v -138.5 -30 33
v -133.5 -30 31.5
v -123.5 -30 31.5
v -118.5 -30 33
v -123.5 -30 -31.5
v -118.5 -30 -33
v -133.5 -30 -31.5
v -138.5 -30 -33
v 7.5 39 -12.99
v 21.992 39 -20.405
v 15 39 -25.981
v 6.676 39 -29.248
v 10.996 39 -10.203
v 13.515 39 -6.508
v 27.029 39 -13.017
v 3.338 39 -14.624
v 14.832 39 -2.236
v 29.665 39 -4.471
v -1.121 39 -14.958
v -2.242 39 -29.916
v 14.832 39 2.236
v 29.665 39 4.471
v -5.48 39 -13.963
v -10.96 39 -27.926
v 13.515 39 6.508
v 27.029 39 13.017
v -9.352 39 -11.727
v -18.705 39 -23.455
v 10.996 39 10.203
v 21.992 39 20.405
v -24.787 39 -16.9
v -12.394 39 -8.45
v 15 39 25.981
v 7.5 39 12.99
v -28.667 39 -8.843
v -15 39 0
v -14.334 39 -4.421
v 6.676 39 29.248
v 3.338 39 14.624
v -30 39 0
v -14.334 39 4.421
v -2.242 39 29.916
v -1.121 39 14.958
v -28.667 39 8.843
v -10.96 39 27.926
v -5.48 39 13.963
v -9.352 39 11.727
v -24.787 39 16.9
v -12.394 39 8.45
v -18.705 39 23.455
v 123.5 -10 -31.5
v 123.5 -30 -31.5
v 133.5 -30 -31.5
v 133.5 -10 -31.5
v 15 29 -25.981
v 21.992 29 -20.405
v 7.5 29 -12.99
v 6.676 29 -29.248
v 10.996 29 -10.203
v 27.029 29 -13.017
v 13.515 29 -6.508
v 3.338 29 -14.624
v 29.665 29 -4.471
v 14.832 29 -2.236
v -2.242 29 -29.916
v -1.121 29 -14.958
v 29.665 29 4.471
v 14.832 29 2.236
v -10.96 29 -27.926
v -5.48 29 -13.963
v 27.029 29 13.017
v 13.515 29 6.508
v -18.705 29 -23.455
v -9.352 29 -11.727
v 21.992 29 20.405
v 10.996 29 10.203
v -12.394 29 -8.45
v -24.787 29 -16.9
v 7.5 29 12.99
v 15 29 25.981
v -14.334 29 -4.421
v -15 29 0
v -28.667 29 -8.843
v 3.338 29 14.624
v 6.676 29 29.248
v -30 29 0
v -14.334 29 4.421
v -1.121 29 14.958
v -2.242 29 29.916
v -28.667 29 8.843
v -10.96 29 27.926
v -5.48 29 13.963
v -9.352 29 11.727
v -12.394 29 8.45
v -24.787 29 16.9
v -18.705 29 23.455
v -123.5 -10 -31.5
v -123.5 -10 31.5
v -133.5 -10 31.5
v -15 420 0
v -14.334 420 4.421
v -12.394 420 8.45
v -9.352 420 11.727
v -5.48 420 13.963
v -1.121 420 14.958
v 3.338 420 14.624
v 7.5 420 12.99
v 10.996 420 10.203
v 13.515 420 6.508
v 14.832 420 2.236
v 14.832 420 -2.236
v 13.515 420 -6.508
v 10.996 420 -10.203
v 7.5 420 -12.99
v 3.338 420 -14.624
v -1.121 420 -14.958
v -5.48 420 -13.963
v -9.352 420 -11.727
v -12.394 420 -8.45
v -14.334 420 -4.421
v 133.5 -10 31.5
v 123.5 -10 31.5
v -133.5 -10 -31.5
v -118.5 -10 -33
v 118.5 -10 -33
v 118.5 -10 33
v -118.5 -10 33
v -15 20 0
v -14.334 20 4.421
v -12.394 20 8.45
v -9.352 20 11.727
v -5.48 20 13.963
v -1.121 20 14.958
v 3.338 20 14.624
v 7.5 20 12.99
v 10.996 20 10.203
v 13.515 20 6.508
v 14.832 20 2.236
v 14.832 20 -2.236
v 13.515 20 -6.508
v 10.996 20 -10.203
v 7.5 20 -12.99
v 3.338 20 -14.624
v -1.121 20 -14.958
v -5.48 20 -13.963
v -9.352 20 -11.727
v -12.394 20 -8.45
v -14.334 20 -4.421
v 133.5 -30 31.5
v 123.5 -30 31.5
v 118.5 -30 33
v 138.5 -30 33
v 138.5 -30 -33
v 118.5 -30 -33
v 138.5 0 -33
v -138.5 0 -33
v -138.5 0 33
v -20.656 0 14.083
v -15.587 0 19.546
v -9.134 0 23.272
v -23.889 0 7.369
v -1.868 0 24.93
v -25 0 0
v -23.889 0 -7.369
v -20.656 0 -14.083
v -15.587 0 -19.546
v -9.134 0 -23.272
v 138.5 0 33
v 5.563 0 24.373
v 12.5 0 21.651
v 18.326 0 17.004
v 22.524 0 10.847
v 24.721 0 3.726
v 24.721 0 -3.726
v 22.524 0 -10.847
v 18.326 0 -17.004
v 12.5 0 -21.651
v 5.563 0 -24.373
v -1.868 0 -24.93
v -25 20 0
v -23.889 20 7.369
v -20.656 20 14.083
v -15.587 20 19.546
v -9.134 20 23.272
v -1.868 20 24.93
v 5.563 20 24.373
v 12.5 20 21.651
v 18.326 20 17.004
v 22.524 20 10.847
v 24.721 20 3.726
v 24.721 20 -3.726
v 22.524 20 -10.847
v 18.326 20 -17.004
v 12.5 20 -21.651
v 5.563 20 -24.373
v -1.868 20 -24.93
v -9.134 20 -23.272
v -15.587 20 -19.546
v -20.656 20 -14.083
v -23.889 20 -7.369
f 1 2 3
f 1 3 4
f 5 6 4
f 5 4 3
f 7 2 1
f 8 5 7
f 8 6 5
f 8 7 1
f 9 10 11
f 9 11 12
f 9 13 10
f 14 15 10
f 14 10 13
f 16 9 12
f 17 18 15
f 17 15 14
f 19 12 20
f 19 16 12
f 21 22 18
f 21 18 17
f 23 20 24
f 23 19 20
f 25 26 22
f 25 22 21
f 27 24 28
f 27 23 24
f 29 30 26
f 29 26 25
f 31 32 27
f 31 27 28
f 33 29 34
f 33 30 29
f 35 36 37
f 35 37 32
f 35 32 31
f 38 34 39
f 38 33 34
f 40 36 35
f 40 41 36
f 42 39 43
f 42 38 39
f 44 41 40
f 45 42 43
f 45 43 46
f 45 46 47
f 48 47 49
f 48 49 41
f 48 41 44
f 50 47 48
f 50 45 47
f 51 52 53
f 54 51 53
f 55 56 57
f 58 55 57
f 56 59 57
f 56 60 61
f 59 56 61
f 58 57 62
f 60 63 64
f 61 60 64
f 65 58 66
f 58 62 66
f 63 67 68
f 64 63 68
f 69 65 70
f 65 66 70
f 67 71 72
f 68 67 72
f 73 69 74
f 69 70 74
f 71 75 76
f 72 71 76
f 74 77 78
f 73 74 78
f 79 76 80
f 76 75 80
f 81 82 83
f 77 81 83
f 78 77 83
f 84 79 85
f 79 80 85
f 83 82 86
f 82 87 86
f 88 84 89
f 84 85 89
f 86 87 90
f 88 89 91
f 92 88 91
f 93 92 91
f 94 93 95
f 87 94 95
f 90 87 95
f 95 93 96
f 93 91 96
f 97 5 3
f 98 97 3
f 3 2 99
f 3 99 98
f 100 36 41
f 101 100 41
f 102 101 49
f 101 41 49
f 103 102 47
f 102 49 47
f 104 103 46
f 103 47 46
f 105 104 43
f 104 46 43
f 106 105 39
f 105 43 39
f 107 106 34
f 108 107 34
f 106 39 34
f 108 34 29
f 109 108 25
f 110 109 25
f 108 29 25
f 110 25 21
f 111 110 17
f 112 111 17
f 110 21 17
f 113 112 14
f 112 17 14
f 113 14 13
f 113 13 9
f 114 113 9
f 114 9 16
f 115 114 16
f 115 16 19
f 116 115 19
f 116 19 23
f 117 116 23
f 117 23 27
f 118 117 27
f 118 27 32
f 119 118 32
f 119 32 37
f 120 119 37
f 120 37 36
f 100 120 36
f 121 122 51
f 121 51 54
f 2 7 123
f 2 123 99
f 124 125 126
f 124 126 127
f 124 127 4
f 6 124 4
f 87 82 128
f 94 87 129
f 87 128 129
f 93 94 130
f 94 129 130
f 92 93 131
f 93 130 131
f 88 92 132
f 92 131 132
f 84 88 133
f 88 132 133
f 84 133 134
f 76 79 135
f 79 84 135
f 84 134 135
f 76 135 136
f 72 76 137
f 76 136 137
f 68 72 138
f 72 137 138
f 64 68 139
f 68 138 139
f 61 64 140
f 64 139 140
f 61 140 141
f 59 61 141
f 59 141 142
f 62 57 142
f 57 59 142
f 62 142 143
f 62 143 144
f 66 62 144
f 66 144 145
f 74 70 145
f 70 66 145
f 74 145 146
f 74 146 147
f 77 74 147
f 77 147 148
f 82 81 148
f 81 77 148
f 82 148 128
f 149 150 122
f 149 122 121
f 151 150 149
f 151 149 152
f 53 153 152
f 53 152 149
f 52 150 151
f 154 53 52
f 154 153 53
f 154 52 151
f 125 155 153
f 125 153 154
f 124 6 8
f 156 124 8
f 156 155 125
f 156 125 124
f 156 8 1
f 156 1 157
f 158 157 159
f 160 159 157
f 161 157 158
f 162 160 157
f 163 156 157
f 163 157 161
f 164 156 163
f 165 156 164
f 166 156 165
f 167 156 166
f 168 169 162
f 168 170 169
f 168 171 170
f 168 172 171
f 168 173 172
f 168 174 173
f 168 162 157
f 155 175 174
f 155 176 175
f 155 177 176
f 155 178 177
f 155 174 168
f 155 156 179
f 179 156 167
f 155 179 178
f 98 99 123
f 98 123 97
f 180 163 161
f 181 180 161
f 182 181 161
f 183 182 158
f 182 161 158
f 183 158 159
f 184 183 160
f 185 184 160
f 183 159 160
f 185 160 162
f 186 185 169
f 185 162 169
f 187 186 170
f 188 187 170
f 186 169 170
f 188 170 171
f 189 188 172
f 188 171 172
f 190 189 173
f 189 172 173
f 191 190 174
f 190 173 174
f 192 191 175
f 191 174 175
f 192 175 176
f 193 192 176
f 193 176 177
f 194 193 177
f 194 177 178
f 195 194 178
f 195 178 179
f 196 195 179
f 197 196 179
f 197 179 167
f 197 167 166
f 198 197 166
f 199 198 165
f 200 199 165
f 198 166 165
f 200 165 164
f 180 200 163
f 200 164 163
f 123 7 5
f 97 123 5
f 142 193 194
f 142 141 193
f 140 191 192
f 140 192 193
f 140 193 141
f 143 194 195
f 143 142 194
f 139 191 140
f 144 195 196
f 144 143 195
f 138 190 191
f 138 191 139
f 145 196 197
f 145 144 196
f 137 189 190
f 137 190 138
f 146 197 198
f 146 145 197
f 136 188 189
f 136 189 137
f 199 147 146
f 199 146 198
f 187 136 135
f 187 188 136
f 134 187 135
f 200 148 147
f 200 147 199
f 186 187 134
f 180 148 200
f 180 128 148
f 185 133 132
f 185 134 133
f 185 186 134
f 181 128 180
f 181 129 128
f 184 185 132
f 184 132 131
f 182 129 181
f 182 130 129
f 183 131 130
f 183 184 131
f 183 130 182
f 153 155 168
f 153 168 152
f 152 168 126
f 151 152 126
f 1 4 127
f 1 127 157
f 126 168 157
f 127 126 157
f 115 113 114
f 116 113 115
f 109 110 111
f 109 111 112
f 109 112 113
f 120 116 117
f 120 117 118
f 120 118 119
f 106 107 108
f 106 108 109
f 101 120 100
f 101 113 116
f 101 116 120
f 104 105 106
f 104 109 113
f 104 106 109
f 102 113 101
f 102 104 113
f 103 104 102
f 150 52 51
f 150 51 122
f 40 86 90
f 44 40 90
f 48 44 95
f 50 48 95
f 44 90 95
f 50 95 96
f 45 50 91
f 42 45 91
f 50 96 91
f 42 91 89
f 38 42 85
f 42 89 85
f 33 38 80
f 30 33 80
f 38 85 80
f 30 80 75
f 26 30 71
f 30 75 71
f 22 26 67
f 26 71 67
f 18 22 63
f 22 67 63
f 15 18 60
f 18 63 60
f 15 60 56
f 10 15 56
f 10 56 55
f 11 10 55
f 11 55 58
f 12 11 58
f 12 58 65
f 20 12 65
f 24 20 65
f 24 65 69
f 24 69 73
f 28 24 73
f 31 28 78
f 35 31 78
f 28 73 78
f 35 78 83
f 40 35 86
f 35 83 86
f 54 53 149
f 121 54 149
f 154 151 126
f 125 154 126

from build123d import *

# Parameters (mm, degrees)
BOSS_EXTRUDE1_DEPTH      = 33
BOSS_EXTRUDE1_DEPTH_BACK = 33
SKETCH2_W                = 10
SKETCH2_H                = 63
CUT_EXTRUDE1_DEPTH       = 20
SKETCH3_R                = 25
BOSS_EXTRUDE2_DEPTH      = 20
SKETCH4_R                = 15
BOSS_EXTRUDE3_DEPTH      = 400
SKETCH5_R                = 30
BOSS_EXTRUDE4_DEPTH      = 10


with BuildPart() as part:
    # Sketch1 → Boss-Extrude1 (new, two sides: drawn at the far end of the back side and taken through both)
    with BuildSketch(Plane.XY.offset(-BOSS_EXTRUDE1_DEPTH_BACK)):
        Polygon((-138.5, 0), (138.5, 0), (138.5, -30), (118.5, -30), (118.5, -10), (-118.5, -10), (-118.5, -30), (-138.5, -30), align=None)
    extrude(amount=BOSS_EXTRUDE1_DEPTH + BOSS_EXTRUDE1_DEPTH_BACK)

    # Sketch2 → Cut-Extrude1 (cut)
    with BuildSketch(Plane.XZ.offset(30)):
        with Locations((-128.5, 0)):
            Rectangle(SKETCH2_W, SKETCH2_H)
        with Locations((128.5, 0)):
            Rectangle(SKETCH2_W, SKETCH2_H)
    extrude(amount=-CUT_EXTRUDE1_DEPTH, mode=Mode.SUBTRACT)

    # Sketch3 → Boss-Extrude2 (add)
    with BuildSketch(Plane(origin=(0, 0, 0), x_dir=(1, 0, 0), z_dir=(0, 1, 0))):
        Circle(SKETCH3_R)
    extrude(amount=BOSS_EXTRUDE2_DEPTH)

    # Sketch4 → Boss-Extrude3 (add)
    with BuildSketch(Plane(origin=(0, 20, 0), x_dir=(1, 0, 0), z_dir=(0, 1, 0))):
        Circle(SKETCH4_R)
    extrude(amount=BOSS_EXTRUDE3_DEPTH)

    # Sketch5 → Boss-Extrude4 (add)
    with BuildSketch(Plane(origin=(0, 29, 0), x_dir=(1, 0, 0), z_dir=(0, 1, 0))):
        Circle(SKETCH5_R)
    extrude(amount=BOSS_EXTRUDE4_DEPTH)


solid = part.part
